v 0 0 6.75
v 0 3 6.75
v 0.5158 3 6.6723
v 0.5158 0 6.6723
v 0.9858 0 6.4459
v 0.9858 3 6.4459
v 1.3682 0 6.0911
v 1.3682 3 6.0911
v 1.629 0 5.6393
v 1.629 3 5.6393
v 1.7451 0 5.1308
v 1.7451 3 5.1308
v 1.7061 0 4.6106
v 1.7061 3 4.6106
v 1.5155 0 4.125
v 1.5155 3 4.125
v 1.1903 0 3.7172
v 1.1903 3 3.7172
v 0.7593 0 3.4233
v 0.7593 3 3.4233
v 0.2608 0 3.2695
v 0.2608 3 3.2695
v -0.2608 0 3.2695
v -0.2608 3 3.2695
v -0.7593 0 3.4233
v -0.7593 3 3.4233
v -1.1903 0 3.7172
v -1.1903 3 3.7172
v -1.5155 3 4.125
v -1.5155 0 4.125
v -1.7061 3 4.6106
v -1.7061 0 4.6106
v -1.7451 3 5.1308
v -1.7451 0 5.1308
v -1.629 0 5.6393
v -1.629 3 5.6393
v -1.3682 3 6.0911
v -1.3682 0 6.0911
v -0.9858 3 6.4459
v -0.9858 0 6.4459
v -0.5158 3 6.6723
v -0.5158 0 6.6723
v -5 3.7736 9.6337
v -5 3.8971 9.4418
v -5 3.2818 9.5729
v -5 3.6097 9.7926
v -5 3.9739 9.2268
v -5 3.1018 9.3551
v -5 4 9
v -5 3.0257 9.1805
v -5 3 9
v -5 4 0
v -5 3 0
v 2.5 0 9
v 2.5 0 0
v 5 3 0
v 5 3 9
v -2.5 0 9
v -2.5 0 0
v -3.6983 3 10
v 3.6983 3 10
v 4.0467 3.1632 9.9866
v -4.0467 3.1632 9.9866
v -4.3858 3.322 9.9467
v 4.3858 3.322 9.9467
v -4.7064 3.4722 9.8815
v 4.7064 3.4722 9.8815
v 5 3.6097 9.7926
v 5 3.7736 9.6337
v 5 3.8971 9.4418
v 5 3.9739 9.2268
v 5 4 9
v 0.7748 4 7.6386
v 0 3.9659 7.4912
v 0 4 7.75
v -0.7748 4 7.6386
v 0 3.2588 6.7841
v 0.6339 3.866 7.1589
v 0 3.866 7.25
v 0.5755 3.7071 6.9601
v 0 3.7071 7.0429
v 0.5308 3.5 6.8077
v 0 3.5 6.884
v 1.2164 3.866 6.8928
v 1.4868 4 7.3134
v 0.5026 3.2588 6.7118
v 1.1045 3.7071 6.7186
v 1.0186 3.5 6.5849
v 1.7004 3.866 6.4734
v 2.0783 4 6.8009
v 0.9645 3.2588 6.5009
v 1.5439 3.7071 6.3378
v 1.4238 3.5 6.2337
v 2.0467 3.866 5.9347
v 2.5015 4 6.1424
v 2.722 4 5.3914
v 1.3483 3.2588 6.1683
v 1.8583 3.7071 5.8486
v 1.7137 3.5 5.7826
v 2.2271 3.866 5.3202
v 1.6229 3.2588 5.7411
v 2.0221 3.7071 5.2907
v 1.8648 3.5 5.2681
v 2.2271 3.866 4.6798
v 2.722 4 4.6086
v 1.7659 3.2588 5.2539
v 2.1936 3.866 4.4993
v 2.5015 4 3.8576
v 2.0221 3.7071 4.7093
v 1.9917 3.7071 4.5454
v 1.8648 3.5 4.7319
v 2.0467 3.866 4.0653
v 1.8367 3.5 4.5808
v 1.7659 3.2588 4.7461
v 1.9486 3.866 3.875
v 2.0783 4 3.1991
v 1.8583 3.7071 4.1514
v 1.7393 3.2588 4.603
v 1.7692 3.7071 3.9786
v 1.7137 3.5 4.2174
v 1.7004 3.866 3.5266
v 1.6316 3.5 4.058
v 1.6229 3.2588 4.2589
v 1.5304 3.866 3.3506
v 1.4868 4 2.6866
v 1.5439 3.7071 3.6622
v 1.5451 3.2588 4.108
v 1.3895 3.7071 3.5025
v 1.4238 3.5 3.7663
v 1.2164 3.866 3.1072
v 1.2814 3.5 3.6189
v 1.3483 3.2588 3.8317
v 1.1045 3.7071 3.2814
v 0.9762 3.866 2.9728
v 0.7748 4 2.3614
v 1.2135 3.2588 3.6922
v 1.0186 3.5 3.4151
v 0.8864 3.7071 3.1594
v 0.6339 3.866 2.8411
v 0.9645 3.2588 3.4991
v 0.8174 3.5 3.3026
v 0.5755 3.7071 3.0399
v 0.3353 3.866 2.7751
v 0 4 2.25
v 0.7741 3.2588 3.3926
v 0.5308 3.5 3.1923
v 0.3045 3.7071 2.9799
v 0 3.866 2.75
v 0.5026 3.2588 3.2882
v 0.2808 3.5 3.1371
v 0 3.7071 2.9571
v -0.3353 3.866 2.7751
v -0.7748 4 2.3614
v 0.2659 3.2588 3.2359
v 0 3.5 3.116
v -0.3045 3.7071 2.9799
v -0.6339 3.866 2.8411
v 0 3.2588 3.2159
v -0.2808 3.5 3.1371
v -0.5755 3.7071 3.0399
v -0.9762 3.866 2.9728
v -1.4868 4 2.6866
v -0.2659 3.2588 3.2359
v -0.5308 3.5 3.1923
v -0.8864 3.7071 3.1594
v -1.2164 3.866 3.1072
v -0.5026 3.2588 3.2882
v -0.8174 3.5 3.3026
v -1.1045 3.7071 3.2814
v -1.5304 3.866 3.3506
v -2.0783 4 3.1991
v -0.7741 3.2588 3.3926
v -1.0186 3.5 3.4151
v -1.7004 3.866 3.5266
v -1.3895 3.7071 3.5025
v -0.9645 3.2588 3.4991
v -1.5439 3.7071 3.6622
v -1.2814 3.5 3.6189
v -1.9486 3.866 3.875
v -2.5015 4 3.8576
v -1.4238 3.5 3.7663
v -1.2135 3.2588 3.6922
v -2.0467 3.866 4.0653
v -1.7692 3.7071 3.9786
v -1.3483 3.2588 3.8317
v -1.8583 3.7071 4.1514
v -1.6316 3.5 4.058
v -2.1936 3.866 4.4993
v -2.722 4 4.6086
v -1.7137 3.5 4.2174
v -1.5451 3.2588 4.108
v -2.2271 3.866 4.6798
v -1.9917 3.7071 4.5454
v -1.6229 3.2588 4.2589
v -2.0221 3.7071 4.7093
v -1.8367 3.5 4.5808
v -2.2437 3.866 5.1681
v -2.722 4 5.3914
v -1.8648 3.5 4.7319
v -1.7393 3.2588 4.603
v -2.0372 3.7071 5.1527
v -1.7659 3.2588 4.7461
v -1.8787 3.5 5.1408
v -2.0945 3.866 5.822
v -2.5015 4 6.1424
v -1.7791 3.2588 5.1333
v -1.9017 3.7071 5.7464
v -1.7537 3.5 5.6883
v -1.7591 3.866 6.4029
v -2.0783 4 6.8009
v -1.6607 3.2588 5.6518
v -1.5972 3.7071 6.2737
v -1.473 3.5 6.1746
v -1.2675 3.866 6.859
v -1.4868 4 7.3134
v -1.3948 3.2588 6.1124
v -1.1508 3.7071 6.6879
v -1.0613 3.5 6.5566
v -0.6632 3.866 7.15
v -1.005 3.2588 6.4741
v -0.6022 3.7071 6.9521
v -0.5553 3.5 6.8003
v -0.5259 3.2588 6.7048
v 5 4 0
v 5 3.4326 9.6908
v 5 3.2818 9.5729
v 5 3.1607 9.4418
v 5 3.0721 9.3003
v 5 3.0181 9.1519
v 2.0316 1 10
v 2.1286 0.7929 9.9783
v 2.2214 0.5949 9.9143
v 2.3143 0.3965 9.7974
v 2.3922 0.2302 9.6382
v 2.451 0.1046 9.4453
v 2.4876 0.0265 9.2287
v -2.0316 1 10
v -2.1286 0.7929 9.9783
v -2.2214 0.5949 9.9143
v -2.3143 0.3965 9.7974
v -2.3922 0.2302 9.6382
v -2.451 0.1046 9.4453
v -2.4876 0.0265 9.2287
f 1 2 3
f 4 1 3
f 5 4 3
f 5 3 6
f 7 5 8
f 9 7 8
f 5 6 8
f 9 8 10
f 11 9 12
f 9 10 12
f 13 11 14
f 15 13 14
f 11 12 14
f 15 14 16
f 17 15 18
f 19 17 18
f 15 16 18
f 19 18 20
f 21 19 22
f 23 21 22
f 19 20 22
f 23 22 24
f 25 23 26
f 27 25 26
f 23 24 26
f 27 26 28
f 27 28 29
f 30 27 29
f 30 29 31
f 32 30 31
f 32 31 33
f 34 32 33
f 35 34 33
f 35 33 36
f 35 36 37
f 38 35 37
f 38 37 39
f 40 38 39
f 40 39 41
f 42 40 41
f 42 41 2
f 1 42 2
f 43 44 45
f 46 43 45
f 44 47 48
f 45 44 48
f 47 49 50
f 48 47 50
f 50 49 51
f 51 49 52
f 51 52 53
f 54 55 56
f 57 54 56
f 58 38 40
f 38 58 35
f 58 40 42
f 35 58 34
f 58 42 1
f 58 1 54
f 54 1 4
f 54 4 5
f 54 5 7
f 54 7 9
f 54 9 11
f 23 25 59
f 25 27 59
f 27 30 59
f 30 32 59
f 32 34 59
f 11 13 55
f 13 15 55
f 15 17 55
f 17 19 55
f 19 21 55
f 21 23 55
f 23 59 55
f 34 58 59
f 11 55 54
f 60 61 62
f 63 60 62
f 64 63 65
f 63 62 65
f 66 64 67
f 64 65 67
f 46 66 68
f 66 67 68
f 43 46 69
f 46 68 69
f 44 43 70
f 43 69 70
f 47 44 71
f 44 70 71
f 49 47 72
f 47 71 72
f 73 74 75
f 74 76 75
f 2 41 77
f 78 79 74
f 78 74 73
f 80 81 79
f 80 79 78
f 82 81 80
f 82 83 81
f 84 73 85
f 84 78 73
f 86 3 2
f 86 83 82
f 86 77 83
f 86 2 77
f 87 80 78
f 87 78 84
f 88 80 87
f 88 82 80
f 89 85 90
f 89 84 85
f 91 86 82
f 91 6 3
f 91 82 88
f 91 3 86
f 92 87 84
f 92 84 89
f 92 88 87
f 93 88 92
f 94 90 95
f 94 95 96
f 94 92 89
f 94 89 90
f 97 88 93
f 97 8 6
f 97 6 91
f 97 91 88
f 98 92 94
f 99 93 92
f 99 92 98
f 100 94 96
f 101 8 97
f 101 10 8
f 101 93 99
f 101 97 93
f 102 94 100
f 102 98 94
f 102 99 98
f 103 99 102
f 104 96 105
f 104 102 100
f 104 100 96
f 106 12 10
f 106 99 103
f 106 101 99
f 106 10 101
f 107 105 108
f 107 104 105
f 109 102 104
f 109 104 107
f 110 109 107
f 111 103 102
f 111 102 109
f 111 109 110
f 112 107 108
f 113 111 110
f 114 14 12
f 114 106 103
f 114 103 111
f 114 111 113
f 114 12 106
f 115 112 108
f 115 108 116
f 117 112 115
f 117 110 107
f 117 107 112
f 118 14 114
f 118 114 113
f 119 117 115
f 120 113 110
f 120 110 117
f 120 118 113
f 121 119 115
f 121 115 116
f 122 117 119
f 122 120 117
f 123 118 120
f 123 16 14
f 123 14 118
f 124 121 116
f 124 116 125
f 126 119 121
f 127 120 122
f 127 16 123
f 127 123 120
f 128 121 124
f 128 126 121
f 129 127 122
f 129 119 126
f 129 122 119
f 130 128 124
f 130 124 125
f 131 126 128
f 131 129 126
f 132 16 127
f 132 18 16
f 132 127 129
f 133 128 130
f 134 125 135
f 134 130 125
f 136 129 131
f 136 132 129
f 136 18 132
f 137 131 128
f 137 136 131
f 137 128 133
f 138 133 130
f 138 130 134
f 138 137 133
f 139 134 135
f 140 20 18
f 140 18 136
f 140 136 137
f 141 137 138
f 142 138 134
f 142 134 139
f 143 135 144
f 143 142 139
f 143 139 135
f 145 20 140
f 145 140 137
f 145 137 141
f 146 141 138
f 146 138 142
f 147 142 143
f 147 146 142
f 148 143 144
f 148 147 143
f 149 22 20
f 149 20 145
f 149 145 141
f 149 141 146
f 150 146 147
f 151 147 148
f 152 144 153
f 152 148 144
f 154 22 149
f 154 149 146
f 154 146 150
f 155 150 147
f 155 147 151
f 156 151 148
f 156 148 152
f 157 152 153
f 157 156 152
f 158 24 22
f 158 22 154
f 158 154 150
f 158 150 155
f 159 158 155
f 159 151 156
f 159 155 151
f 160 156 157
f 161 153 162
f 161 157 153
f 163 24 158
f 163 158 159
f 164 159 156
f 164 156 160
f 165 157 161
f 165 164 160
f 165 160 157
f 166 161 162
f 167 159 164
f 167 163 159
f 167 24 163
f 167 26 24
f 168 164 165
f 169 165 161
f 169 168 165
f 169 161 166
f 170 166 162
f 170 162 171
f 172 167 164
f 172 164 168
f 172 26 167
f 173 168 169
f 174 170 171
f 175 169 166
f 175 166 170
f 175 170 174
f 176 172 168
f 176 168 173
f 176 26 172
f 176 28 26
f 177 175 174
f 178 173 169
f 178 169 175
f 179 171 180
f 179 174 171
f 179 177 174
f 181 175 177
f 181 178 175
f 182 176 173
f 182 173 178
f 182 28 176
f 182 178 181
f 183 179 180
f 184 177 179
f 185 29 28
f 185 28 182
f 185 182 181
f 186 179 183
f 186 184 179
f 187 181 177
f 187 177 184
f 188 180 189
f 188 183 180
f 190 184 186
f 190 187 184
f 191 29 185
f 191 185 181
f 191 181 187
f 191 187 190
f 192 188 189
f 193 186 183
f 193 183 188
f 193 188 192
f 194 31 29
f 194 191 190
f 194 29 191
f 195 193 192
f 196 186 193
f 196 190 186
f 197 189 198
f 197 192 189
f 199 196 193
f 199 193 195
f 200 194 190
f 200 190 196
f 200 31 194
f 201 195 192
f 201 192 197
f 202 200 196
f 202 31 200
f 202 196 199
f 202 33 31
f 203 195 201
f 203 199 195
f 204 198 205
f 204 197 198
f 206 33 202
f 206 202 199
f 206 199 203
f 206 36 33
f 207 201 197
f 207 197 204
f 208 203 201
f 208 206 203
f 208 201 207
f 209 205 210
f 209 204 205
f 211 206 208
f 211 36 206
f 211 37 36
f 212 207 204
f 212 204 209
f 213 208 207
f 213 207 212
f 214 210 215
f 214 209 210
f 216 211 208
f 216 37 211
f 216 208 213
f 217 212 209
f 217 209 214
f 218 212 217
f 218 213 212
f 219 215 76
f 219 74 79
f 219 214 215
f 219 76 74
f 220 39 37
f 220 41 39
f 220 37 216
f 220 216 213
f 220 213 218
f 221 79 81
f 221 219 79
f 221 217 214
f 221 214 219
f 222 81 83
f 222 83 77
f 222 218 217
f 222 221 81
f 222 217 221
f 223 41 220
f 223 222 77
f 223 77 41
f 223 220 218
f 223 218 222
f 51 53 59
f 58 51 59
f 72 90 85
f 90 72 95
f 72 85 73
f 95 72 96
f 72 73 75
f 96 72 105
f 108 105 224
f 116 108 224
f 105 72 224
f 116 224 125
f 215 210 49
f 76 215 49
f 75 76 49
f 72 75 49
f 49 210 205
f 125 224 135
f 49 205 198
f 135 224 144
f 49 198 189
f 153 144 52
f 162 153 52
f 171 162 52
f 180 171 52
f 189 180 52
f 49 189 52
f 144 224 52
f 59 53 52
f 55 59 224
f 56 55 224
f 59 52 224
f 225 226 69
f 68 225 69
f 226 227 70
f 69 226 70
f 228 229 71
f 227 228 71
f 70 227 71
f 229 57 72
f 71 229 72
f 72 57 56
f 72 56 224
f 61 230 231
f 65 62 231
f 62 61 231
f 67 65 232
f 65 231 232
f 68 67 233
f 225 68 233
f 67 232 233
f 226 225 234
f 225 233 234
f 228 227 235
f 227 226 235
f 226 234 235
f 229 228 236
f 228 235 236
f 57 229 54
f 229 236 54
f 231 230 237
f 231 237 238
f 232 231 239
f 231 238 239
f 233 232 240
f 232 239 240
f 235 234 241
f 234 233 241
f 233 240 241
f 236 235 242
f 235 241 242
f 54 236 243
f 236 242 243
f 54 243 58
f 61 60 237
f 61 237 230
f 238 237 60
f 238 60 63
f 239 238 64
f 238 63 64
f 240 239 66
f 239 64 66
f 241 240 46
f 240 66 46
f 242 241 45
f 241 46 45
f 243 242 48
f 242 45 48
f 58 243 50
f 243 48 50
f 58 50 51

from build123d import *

# Parameters (mm, degrees)
BOSS_EXTRUDE1_DEPTH = 10
SKETCH3_R           = 1.75
CUT_EXTRUDE1_DEPTH  = 12.874342087
FILLET2_R           = 1


with BuildPart() as part:
    # Sketch1 → Boss-Extrude1 (new body)
    with BuildSketch(Plane.XY):
        Polygon((-2.5, 0), (2.5, 0), (5, 3), (5, 4), (-5, 4), (-5, 3), align=None)
    extrude(amount=BOSS_EXTRUDE1_DEPTH)

    # Sketch3 → Cut-Extrude1 (cut, through all)
    with BuildSketch(Plane(origin=(0, 4, 0), x_dir=(1, 0, 0), z_dir=(0, 1, 0))):
        with Locations(Location((0, -5, 0), (0, 0, 270))):
            Circle(SKETCH3_R)
    extrude(amount=-CUT_EXTRUDE1_DEPTH, mode=Mode.SUBTRACT)

    # Fillet2
    # the kernel refuses this fillet: 1 mm, written as the material it takes off along each edge
    with BuildSketch(Plane(origin=(-5, 0, 10), x_dir=(0, 0, -1), z_dir=(1, 0, 0))) as fillet2_piece_1:
        with BuildLine():
            CenterArc((FILLET2_R, FILLET2_R), FILLET2_R, 180, 90)
            Line((0, FILLET2_R), (0, 0))
            Line((0, 0), (FILLET2_R, 0))
        make_face()
    extrude(amount=10, mode=Mode.SUBTRACT)
    with BuildSketch(Plane(origin=(0.899539001, -1.920553199, 10), x_dir=(-0.768221279597376, 0.6401843996644797, 0), z_dir=(0.6401843996644797, 0.768221279597376, 0))) as fillet2_piece_2:
        with BuildLine():
            CenterArc((FILLET2_R, -FILLET2_R), FILLET2_R, 90, 90)
            Line((0, -FILLET2_R), (0, 0))
            Line((0, 0), (FILLET2_R, 0))
        make_face()
    extrude(amount=8.905124838, mode=Mode.SUBTRACT)
    with BuildSketch(Plane(origin=(-6.600460999, 4.920553199, 10), x_dir=(0, 0, -1), z_dir=(0.6401843996644797, -0.768221279597376, 0))) as fillet2_piece_3:
        with BuildLine():
            CenterArc((FILLET2_R, FILLET2_R), FILLET2_R, 180, 90)
            Line((0, FILLET2_R), (0, 0))
            Line((0, 0), (FILLET2_R, 0))
        make_face()
    extrude(amount=8.905124838, mode=Mode.SUBTRACT)
    with BuildSketch(Plane(origin=(7.5, 4, 10), x_dir=(0, -1, 0), z_dir=(-1, 0, 0))) as fillet2_piece_4:
        with BuildLine():
            CenterArc((FILLET2_R, -FILLET2_R), FILLET2_R, 90, 90)
            Line((0, -FILLET2_R), (0, 0))
            Line((0, 0), (FILLET2_R, 0))
        make_face()
    extrude(amount=15, mode=Mode.SUBTRACT)
    with BuildSketch(Plane(origin=(0, 4, 5), x_dir=(0, 0, 1), z_dir=(-1, 0, 0))) as fillet2_piece_5:
        with BuildLine():
            CenterArc((1.75 + FILLET2_R, -FILLET2_R), FILLET2_R, 90, 90)
            Line((1.75 + FILLET2_R, 0), (1.75, 0))
            Line((1.75, 0), (1.75, -FILLET2_R))
        make_face()
    revolve(axis=Axis((0, 4, 5), (0, 1, 0)), mode=Mode.SUBTRACT)


solid = part.part
